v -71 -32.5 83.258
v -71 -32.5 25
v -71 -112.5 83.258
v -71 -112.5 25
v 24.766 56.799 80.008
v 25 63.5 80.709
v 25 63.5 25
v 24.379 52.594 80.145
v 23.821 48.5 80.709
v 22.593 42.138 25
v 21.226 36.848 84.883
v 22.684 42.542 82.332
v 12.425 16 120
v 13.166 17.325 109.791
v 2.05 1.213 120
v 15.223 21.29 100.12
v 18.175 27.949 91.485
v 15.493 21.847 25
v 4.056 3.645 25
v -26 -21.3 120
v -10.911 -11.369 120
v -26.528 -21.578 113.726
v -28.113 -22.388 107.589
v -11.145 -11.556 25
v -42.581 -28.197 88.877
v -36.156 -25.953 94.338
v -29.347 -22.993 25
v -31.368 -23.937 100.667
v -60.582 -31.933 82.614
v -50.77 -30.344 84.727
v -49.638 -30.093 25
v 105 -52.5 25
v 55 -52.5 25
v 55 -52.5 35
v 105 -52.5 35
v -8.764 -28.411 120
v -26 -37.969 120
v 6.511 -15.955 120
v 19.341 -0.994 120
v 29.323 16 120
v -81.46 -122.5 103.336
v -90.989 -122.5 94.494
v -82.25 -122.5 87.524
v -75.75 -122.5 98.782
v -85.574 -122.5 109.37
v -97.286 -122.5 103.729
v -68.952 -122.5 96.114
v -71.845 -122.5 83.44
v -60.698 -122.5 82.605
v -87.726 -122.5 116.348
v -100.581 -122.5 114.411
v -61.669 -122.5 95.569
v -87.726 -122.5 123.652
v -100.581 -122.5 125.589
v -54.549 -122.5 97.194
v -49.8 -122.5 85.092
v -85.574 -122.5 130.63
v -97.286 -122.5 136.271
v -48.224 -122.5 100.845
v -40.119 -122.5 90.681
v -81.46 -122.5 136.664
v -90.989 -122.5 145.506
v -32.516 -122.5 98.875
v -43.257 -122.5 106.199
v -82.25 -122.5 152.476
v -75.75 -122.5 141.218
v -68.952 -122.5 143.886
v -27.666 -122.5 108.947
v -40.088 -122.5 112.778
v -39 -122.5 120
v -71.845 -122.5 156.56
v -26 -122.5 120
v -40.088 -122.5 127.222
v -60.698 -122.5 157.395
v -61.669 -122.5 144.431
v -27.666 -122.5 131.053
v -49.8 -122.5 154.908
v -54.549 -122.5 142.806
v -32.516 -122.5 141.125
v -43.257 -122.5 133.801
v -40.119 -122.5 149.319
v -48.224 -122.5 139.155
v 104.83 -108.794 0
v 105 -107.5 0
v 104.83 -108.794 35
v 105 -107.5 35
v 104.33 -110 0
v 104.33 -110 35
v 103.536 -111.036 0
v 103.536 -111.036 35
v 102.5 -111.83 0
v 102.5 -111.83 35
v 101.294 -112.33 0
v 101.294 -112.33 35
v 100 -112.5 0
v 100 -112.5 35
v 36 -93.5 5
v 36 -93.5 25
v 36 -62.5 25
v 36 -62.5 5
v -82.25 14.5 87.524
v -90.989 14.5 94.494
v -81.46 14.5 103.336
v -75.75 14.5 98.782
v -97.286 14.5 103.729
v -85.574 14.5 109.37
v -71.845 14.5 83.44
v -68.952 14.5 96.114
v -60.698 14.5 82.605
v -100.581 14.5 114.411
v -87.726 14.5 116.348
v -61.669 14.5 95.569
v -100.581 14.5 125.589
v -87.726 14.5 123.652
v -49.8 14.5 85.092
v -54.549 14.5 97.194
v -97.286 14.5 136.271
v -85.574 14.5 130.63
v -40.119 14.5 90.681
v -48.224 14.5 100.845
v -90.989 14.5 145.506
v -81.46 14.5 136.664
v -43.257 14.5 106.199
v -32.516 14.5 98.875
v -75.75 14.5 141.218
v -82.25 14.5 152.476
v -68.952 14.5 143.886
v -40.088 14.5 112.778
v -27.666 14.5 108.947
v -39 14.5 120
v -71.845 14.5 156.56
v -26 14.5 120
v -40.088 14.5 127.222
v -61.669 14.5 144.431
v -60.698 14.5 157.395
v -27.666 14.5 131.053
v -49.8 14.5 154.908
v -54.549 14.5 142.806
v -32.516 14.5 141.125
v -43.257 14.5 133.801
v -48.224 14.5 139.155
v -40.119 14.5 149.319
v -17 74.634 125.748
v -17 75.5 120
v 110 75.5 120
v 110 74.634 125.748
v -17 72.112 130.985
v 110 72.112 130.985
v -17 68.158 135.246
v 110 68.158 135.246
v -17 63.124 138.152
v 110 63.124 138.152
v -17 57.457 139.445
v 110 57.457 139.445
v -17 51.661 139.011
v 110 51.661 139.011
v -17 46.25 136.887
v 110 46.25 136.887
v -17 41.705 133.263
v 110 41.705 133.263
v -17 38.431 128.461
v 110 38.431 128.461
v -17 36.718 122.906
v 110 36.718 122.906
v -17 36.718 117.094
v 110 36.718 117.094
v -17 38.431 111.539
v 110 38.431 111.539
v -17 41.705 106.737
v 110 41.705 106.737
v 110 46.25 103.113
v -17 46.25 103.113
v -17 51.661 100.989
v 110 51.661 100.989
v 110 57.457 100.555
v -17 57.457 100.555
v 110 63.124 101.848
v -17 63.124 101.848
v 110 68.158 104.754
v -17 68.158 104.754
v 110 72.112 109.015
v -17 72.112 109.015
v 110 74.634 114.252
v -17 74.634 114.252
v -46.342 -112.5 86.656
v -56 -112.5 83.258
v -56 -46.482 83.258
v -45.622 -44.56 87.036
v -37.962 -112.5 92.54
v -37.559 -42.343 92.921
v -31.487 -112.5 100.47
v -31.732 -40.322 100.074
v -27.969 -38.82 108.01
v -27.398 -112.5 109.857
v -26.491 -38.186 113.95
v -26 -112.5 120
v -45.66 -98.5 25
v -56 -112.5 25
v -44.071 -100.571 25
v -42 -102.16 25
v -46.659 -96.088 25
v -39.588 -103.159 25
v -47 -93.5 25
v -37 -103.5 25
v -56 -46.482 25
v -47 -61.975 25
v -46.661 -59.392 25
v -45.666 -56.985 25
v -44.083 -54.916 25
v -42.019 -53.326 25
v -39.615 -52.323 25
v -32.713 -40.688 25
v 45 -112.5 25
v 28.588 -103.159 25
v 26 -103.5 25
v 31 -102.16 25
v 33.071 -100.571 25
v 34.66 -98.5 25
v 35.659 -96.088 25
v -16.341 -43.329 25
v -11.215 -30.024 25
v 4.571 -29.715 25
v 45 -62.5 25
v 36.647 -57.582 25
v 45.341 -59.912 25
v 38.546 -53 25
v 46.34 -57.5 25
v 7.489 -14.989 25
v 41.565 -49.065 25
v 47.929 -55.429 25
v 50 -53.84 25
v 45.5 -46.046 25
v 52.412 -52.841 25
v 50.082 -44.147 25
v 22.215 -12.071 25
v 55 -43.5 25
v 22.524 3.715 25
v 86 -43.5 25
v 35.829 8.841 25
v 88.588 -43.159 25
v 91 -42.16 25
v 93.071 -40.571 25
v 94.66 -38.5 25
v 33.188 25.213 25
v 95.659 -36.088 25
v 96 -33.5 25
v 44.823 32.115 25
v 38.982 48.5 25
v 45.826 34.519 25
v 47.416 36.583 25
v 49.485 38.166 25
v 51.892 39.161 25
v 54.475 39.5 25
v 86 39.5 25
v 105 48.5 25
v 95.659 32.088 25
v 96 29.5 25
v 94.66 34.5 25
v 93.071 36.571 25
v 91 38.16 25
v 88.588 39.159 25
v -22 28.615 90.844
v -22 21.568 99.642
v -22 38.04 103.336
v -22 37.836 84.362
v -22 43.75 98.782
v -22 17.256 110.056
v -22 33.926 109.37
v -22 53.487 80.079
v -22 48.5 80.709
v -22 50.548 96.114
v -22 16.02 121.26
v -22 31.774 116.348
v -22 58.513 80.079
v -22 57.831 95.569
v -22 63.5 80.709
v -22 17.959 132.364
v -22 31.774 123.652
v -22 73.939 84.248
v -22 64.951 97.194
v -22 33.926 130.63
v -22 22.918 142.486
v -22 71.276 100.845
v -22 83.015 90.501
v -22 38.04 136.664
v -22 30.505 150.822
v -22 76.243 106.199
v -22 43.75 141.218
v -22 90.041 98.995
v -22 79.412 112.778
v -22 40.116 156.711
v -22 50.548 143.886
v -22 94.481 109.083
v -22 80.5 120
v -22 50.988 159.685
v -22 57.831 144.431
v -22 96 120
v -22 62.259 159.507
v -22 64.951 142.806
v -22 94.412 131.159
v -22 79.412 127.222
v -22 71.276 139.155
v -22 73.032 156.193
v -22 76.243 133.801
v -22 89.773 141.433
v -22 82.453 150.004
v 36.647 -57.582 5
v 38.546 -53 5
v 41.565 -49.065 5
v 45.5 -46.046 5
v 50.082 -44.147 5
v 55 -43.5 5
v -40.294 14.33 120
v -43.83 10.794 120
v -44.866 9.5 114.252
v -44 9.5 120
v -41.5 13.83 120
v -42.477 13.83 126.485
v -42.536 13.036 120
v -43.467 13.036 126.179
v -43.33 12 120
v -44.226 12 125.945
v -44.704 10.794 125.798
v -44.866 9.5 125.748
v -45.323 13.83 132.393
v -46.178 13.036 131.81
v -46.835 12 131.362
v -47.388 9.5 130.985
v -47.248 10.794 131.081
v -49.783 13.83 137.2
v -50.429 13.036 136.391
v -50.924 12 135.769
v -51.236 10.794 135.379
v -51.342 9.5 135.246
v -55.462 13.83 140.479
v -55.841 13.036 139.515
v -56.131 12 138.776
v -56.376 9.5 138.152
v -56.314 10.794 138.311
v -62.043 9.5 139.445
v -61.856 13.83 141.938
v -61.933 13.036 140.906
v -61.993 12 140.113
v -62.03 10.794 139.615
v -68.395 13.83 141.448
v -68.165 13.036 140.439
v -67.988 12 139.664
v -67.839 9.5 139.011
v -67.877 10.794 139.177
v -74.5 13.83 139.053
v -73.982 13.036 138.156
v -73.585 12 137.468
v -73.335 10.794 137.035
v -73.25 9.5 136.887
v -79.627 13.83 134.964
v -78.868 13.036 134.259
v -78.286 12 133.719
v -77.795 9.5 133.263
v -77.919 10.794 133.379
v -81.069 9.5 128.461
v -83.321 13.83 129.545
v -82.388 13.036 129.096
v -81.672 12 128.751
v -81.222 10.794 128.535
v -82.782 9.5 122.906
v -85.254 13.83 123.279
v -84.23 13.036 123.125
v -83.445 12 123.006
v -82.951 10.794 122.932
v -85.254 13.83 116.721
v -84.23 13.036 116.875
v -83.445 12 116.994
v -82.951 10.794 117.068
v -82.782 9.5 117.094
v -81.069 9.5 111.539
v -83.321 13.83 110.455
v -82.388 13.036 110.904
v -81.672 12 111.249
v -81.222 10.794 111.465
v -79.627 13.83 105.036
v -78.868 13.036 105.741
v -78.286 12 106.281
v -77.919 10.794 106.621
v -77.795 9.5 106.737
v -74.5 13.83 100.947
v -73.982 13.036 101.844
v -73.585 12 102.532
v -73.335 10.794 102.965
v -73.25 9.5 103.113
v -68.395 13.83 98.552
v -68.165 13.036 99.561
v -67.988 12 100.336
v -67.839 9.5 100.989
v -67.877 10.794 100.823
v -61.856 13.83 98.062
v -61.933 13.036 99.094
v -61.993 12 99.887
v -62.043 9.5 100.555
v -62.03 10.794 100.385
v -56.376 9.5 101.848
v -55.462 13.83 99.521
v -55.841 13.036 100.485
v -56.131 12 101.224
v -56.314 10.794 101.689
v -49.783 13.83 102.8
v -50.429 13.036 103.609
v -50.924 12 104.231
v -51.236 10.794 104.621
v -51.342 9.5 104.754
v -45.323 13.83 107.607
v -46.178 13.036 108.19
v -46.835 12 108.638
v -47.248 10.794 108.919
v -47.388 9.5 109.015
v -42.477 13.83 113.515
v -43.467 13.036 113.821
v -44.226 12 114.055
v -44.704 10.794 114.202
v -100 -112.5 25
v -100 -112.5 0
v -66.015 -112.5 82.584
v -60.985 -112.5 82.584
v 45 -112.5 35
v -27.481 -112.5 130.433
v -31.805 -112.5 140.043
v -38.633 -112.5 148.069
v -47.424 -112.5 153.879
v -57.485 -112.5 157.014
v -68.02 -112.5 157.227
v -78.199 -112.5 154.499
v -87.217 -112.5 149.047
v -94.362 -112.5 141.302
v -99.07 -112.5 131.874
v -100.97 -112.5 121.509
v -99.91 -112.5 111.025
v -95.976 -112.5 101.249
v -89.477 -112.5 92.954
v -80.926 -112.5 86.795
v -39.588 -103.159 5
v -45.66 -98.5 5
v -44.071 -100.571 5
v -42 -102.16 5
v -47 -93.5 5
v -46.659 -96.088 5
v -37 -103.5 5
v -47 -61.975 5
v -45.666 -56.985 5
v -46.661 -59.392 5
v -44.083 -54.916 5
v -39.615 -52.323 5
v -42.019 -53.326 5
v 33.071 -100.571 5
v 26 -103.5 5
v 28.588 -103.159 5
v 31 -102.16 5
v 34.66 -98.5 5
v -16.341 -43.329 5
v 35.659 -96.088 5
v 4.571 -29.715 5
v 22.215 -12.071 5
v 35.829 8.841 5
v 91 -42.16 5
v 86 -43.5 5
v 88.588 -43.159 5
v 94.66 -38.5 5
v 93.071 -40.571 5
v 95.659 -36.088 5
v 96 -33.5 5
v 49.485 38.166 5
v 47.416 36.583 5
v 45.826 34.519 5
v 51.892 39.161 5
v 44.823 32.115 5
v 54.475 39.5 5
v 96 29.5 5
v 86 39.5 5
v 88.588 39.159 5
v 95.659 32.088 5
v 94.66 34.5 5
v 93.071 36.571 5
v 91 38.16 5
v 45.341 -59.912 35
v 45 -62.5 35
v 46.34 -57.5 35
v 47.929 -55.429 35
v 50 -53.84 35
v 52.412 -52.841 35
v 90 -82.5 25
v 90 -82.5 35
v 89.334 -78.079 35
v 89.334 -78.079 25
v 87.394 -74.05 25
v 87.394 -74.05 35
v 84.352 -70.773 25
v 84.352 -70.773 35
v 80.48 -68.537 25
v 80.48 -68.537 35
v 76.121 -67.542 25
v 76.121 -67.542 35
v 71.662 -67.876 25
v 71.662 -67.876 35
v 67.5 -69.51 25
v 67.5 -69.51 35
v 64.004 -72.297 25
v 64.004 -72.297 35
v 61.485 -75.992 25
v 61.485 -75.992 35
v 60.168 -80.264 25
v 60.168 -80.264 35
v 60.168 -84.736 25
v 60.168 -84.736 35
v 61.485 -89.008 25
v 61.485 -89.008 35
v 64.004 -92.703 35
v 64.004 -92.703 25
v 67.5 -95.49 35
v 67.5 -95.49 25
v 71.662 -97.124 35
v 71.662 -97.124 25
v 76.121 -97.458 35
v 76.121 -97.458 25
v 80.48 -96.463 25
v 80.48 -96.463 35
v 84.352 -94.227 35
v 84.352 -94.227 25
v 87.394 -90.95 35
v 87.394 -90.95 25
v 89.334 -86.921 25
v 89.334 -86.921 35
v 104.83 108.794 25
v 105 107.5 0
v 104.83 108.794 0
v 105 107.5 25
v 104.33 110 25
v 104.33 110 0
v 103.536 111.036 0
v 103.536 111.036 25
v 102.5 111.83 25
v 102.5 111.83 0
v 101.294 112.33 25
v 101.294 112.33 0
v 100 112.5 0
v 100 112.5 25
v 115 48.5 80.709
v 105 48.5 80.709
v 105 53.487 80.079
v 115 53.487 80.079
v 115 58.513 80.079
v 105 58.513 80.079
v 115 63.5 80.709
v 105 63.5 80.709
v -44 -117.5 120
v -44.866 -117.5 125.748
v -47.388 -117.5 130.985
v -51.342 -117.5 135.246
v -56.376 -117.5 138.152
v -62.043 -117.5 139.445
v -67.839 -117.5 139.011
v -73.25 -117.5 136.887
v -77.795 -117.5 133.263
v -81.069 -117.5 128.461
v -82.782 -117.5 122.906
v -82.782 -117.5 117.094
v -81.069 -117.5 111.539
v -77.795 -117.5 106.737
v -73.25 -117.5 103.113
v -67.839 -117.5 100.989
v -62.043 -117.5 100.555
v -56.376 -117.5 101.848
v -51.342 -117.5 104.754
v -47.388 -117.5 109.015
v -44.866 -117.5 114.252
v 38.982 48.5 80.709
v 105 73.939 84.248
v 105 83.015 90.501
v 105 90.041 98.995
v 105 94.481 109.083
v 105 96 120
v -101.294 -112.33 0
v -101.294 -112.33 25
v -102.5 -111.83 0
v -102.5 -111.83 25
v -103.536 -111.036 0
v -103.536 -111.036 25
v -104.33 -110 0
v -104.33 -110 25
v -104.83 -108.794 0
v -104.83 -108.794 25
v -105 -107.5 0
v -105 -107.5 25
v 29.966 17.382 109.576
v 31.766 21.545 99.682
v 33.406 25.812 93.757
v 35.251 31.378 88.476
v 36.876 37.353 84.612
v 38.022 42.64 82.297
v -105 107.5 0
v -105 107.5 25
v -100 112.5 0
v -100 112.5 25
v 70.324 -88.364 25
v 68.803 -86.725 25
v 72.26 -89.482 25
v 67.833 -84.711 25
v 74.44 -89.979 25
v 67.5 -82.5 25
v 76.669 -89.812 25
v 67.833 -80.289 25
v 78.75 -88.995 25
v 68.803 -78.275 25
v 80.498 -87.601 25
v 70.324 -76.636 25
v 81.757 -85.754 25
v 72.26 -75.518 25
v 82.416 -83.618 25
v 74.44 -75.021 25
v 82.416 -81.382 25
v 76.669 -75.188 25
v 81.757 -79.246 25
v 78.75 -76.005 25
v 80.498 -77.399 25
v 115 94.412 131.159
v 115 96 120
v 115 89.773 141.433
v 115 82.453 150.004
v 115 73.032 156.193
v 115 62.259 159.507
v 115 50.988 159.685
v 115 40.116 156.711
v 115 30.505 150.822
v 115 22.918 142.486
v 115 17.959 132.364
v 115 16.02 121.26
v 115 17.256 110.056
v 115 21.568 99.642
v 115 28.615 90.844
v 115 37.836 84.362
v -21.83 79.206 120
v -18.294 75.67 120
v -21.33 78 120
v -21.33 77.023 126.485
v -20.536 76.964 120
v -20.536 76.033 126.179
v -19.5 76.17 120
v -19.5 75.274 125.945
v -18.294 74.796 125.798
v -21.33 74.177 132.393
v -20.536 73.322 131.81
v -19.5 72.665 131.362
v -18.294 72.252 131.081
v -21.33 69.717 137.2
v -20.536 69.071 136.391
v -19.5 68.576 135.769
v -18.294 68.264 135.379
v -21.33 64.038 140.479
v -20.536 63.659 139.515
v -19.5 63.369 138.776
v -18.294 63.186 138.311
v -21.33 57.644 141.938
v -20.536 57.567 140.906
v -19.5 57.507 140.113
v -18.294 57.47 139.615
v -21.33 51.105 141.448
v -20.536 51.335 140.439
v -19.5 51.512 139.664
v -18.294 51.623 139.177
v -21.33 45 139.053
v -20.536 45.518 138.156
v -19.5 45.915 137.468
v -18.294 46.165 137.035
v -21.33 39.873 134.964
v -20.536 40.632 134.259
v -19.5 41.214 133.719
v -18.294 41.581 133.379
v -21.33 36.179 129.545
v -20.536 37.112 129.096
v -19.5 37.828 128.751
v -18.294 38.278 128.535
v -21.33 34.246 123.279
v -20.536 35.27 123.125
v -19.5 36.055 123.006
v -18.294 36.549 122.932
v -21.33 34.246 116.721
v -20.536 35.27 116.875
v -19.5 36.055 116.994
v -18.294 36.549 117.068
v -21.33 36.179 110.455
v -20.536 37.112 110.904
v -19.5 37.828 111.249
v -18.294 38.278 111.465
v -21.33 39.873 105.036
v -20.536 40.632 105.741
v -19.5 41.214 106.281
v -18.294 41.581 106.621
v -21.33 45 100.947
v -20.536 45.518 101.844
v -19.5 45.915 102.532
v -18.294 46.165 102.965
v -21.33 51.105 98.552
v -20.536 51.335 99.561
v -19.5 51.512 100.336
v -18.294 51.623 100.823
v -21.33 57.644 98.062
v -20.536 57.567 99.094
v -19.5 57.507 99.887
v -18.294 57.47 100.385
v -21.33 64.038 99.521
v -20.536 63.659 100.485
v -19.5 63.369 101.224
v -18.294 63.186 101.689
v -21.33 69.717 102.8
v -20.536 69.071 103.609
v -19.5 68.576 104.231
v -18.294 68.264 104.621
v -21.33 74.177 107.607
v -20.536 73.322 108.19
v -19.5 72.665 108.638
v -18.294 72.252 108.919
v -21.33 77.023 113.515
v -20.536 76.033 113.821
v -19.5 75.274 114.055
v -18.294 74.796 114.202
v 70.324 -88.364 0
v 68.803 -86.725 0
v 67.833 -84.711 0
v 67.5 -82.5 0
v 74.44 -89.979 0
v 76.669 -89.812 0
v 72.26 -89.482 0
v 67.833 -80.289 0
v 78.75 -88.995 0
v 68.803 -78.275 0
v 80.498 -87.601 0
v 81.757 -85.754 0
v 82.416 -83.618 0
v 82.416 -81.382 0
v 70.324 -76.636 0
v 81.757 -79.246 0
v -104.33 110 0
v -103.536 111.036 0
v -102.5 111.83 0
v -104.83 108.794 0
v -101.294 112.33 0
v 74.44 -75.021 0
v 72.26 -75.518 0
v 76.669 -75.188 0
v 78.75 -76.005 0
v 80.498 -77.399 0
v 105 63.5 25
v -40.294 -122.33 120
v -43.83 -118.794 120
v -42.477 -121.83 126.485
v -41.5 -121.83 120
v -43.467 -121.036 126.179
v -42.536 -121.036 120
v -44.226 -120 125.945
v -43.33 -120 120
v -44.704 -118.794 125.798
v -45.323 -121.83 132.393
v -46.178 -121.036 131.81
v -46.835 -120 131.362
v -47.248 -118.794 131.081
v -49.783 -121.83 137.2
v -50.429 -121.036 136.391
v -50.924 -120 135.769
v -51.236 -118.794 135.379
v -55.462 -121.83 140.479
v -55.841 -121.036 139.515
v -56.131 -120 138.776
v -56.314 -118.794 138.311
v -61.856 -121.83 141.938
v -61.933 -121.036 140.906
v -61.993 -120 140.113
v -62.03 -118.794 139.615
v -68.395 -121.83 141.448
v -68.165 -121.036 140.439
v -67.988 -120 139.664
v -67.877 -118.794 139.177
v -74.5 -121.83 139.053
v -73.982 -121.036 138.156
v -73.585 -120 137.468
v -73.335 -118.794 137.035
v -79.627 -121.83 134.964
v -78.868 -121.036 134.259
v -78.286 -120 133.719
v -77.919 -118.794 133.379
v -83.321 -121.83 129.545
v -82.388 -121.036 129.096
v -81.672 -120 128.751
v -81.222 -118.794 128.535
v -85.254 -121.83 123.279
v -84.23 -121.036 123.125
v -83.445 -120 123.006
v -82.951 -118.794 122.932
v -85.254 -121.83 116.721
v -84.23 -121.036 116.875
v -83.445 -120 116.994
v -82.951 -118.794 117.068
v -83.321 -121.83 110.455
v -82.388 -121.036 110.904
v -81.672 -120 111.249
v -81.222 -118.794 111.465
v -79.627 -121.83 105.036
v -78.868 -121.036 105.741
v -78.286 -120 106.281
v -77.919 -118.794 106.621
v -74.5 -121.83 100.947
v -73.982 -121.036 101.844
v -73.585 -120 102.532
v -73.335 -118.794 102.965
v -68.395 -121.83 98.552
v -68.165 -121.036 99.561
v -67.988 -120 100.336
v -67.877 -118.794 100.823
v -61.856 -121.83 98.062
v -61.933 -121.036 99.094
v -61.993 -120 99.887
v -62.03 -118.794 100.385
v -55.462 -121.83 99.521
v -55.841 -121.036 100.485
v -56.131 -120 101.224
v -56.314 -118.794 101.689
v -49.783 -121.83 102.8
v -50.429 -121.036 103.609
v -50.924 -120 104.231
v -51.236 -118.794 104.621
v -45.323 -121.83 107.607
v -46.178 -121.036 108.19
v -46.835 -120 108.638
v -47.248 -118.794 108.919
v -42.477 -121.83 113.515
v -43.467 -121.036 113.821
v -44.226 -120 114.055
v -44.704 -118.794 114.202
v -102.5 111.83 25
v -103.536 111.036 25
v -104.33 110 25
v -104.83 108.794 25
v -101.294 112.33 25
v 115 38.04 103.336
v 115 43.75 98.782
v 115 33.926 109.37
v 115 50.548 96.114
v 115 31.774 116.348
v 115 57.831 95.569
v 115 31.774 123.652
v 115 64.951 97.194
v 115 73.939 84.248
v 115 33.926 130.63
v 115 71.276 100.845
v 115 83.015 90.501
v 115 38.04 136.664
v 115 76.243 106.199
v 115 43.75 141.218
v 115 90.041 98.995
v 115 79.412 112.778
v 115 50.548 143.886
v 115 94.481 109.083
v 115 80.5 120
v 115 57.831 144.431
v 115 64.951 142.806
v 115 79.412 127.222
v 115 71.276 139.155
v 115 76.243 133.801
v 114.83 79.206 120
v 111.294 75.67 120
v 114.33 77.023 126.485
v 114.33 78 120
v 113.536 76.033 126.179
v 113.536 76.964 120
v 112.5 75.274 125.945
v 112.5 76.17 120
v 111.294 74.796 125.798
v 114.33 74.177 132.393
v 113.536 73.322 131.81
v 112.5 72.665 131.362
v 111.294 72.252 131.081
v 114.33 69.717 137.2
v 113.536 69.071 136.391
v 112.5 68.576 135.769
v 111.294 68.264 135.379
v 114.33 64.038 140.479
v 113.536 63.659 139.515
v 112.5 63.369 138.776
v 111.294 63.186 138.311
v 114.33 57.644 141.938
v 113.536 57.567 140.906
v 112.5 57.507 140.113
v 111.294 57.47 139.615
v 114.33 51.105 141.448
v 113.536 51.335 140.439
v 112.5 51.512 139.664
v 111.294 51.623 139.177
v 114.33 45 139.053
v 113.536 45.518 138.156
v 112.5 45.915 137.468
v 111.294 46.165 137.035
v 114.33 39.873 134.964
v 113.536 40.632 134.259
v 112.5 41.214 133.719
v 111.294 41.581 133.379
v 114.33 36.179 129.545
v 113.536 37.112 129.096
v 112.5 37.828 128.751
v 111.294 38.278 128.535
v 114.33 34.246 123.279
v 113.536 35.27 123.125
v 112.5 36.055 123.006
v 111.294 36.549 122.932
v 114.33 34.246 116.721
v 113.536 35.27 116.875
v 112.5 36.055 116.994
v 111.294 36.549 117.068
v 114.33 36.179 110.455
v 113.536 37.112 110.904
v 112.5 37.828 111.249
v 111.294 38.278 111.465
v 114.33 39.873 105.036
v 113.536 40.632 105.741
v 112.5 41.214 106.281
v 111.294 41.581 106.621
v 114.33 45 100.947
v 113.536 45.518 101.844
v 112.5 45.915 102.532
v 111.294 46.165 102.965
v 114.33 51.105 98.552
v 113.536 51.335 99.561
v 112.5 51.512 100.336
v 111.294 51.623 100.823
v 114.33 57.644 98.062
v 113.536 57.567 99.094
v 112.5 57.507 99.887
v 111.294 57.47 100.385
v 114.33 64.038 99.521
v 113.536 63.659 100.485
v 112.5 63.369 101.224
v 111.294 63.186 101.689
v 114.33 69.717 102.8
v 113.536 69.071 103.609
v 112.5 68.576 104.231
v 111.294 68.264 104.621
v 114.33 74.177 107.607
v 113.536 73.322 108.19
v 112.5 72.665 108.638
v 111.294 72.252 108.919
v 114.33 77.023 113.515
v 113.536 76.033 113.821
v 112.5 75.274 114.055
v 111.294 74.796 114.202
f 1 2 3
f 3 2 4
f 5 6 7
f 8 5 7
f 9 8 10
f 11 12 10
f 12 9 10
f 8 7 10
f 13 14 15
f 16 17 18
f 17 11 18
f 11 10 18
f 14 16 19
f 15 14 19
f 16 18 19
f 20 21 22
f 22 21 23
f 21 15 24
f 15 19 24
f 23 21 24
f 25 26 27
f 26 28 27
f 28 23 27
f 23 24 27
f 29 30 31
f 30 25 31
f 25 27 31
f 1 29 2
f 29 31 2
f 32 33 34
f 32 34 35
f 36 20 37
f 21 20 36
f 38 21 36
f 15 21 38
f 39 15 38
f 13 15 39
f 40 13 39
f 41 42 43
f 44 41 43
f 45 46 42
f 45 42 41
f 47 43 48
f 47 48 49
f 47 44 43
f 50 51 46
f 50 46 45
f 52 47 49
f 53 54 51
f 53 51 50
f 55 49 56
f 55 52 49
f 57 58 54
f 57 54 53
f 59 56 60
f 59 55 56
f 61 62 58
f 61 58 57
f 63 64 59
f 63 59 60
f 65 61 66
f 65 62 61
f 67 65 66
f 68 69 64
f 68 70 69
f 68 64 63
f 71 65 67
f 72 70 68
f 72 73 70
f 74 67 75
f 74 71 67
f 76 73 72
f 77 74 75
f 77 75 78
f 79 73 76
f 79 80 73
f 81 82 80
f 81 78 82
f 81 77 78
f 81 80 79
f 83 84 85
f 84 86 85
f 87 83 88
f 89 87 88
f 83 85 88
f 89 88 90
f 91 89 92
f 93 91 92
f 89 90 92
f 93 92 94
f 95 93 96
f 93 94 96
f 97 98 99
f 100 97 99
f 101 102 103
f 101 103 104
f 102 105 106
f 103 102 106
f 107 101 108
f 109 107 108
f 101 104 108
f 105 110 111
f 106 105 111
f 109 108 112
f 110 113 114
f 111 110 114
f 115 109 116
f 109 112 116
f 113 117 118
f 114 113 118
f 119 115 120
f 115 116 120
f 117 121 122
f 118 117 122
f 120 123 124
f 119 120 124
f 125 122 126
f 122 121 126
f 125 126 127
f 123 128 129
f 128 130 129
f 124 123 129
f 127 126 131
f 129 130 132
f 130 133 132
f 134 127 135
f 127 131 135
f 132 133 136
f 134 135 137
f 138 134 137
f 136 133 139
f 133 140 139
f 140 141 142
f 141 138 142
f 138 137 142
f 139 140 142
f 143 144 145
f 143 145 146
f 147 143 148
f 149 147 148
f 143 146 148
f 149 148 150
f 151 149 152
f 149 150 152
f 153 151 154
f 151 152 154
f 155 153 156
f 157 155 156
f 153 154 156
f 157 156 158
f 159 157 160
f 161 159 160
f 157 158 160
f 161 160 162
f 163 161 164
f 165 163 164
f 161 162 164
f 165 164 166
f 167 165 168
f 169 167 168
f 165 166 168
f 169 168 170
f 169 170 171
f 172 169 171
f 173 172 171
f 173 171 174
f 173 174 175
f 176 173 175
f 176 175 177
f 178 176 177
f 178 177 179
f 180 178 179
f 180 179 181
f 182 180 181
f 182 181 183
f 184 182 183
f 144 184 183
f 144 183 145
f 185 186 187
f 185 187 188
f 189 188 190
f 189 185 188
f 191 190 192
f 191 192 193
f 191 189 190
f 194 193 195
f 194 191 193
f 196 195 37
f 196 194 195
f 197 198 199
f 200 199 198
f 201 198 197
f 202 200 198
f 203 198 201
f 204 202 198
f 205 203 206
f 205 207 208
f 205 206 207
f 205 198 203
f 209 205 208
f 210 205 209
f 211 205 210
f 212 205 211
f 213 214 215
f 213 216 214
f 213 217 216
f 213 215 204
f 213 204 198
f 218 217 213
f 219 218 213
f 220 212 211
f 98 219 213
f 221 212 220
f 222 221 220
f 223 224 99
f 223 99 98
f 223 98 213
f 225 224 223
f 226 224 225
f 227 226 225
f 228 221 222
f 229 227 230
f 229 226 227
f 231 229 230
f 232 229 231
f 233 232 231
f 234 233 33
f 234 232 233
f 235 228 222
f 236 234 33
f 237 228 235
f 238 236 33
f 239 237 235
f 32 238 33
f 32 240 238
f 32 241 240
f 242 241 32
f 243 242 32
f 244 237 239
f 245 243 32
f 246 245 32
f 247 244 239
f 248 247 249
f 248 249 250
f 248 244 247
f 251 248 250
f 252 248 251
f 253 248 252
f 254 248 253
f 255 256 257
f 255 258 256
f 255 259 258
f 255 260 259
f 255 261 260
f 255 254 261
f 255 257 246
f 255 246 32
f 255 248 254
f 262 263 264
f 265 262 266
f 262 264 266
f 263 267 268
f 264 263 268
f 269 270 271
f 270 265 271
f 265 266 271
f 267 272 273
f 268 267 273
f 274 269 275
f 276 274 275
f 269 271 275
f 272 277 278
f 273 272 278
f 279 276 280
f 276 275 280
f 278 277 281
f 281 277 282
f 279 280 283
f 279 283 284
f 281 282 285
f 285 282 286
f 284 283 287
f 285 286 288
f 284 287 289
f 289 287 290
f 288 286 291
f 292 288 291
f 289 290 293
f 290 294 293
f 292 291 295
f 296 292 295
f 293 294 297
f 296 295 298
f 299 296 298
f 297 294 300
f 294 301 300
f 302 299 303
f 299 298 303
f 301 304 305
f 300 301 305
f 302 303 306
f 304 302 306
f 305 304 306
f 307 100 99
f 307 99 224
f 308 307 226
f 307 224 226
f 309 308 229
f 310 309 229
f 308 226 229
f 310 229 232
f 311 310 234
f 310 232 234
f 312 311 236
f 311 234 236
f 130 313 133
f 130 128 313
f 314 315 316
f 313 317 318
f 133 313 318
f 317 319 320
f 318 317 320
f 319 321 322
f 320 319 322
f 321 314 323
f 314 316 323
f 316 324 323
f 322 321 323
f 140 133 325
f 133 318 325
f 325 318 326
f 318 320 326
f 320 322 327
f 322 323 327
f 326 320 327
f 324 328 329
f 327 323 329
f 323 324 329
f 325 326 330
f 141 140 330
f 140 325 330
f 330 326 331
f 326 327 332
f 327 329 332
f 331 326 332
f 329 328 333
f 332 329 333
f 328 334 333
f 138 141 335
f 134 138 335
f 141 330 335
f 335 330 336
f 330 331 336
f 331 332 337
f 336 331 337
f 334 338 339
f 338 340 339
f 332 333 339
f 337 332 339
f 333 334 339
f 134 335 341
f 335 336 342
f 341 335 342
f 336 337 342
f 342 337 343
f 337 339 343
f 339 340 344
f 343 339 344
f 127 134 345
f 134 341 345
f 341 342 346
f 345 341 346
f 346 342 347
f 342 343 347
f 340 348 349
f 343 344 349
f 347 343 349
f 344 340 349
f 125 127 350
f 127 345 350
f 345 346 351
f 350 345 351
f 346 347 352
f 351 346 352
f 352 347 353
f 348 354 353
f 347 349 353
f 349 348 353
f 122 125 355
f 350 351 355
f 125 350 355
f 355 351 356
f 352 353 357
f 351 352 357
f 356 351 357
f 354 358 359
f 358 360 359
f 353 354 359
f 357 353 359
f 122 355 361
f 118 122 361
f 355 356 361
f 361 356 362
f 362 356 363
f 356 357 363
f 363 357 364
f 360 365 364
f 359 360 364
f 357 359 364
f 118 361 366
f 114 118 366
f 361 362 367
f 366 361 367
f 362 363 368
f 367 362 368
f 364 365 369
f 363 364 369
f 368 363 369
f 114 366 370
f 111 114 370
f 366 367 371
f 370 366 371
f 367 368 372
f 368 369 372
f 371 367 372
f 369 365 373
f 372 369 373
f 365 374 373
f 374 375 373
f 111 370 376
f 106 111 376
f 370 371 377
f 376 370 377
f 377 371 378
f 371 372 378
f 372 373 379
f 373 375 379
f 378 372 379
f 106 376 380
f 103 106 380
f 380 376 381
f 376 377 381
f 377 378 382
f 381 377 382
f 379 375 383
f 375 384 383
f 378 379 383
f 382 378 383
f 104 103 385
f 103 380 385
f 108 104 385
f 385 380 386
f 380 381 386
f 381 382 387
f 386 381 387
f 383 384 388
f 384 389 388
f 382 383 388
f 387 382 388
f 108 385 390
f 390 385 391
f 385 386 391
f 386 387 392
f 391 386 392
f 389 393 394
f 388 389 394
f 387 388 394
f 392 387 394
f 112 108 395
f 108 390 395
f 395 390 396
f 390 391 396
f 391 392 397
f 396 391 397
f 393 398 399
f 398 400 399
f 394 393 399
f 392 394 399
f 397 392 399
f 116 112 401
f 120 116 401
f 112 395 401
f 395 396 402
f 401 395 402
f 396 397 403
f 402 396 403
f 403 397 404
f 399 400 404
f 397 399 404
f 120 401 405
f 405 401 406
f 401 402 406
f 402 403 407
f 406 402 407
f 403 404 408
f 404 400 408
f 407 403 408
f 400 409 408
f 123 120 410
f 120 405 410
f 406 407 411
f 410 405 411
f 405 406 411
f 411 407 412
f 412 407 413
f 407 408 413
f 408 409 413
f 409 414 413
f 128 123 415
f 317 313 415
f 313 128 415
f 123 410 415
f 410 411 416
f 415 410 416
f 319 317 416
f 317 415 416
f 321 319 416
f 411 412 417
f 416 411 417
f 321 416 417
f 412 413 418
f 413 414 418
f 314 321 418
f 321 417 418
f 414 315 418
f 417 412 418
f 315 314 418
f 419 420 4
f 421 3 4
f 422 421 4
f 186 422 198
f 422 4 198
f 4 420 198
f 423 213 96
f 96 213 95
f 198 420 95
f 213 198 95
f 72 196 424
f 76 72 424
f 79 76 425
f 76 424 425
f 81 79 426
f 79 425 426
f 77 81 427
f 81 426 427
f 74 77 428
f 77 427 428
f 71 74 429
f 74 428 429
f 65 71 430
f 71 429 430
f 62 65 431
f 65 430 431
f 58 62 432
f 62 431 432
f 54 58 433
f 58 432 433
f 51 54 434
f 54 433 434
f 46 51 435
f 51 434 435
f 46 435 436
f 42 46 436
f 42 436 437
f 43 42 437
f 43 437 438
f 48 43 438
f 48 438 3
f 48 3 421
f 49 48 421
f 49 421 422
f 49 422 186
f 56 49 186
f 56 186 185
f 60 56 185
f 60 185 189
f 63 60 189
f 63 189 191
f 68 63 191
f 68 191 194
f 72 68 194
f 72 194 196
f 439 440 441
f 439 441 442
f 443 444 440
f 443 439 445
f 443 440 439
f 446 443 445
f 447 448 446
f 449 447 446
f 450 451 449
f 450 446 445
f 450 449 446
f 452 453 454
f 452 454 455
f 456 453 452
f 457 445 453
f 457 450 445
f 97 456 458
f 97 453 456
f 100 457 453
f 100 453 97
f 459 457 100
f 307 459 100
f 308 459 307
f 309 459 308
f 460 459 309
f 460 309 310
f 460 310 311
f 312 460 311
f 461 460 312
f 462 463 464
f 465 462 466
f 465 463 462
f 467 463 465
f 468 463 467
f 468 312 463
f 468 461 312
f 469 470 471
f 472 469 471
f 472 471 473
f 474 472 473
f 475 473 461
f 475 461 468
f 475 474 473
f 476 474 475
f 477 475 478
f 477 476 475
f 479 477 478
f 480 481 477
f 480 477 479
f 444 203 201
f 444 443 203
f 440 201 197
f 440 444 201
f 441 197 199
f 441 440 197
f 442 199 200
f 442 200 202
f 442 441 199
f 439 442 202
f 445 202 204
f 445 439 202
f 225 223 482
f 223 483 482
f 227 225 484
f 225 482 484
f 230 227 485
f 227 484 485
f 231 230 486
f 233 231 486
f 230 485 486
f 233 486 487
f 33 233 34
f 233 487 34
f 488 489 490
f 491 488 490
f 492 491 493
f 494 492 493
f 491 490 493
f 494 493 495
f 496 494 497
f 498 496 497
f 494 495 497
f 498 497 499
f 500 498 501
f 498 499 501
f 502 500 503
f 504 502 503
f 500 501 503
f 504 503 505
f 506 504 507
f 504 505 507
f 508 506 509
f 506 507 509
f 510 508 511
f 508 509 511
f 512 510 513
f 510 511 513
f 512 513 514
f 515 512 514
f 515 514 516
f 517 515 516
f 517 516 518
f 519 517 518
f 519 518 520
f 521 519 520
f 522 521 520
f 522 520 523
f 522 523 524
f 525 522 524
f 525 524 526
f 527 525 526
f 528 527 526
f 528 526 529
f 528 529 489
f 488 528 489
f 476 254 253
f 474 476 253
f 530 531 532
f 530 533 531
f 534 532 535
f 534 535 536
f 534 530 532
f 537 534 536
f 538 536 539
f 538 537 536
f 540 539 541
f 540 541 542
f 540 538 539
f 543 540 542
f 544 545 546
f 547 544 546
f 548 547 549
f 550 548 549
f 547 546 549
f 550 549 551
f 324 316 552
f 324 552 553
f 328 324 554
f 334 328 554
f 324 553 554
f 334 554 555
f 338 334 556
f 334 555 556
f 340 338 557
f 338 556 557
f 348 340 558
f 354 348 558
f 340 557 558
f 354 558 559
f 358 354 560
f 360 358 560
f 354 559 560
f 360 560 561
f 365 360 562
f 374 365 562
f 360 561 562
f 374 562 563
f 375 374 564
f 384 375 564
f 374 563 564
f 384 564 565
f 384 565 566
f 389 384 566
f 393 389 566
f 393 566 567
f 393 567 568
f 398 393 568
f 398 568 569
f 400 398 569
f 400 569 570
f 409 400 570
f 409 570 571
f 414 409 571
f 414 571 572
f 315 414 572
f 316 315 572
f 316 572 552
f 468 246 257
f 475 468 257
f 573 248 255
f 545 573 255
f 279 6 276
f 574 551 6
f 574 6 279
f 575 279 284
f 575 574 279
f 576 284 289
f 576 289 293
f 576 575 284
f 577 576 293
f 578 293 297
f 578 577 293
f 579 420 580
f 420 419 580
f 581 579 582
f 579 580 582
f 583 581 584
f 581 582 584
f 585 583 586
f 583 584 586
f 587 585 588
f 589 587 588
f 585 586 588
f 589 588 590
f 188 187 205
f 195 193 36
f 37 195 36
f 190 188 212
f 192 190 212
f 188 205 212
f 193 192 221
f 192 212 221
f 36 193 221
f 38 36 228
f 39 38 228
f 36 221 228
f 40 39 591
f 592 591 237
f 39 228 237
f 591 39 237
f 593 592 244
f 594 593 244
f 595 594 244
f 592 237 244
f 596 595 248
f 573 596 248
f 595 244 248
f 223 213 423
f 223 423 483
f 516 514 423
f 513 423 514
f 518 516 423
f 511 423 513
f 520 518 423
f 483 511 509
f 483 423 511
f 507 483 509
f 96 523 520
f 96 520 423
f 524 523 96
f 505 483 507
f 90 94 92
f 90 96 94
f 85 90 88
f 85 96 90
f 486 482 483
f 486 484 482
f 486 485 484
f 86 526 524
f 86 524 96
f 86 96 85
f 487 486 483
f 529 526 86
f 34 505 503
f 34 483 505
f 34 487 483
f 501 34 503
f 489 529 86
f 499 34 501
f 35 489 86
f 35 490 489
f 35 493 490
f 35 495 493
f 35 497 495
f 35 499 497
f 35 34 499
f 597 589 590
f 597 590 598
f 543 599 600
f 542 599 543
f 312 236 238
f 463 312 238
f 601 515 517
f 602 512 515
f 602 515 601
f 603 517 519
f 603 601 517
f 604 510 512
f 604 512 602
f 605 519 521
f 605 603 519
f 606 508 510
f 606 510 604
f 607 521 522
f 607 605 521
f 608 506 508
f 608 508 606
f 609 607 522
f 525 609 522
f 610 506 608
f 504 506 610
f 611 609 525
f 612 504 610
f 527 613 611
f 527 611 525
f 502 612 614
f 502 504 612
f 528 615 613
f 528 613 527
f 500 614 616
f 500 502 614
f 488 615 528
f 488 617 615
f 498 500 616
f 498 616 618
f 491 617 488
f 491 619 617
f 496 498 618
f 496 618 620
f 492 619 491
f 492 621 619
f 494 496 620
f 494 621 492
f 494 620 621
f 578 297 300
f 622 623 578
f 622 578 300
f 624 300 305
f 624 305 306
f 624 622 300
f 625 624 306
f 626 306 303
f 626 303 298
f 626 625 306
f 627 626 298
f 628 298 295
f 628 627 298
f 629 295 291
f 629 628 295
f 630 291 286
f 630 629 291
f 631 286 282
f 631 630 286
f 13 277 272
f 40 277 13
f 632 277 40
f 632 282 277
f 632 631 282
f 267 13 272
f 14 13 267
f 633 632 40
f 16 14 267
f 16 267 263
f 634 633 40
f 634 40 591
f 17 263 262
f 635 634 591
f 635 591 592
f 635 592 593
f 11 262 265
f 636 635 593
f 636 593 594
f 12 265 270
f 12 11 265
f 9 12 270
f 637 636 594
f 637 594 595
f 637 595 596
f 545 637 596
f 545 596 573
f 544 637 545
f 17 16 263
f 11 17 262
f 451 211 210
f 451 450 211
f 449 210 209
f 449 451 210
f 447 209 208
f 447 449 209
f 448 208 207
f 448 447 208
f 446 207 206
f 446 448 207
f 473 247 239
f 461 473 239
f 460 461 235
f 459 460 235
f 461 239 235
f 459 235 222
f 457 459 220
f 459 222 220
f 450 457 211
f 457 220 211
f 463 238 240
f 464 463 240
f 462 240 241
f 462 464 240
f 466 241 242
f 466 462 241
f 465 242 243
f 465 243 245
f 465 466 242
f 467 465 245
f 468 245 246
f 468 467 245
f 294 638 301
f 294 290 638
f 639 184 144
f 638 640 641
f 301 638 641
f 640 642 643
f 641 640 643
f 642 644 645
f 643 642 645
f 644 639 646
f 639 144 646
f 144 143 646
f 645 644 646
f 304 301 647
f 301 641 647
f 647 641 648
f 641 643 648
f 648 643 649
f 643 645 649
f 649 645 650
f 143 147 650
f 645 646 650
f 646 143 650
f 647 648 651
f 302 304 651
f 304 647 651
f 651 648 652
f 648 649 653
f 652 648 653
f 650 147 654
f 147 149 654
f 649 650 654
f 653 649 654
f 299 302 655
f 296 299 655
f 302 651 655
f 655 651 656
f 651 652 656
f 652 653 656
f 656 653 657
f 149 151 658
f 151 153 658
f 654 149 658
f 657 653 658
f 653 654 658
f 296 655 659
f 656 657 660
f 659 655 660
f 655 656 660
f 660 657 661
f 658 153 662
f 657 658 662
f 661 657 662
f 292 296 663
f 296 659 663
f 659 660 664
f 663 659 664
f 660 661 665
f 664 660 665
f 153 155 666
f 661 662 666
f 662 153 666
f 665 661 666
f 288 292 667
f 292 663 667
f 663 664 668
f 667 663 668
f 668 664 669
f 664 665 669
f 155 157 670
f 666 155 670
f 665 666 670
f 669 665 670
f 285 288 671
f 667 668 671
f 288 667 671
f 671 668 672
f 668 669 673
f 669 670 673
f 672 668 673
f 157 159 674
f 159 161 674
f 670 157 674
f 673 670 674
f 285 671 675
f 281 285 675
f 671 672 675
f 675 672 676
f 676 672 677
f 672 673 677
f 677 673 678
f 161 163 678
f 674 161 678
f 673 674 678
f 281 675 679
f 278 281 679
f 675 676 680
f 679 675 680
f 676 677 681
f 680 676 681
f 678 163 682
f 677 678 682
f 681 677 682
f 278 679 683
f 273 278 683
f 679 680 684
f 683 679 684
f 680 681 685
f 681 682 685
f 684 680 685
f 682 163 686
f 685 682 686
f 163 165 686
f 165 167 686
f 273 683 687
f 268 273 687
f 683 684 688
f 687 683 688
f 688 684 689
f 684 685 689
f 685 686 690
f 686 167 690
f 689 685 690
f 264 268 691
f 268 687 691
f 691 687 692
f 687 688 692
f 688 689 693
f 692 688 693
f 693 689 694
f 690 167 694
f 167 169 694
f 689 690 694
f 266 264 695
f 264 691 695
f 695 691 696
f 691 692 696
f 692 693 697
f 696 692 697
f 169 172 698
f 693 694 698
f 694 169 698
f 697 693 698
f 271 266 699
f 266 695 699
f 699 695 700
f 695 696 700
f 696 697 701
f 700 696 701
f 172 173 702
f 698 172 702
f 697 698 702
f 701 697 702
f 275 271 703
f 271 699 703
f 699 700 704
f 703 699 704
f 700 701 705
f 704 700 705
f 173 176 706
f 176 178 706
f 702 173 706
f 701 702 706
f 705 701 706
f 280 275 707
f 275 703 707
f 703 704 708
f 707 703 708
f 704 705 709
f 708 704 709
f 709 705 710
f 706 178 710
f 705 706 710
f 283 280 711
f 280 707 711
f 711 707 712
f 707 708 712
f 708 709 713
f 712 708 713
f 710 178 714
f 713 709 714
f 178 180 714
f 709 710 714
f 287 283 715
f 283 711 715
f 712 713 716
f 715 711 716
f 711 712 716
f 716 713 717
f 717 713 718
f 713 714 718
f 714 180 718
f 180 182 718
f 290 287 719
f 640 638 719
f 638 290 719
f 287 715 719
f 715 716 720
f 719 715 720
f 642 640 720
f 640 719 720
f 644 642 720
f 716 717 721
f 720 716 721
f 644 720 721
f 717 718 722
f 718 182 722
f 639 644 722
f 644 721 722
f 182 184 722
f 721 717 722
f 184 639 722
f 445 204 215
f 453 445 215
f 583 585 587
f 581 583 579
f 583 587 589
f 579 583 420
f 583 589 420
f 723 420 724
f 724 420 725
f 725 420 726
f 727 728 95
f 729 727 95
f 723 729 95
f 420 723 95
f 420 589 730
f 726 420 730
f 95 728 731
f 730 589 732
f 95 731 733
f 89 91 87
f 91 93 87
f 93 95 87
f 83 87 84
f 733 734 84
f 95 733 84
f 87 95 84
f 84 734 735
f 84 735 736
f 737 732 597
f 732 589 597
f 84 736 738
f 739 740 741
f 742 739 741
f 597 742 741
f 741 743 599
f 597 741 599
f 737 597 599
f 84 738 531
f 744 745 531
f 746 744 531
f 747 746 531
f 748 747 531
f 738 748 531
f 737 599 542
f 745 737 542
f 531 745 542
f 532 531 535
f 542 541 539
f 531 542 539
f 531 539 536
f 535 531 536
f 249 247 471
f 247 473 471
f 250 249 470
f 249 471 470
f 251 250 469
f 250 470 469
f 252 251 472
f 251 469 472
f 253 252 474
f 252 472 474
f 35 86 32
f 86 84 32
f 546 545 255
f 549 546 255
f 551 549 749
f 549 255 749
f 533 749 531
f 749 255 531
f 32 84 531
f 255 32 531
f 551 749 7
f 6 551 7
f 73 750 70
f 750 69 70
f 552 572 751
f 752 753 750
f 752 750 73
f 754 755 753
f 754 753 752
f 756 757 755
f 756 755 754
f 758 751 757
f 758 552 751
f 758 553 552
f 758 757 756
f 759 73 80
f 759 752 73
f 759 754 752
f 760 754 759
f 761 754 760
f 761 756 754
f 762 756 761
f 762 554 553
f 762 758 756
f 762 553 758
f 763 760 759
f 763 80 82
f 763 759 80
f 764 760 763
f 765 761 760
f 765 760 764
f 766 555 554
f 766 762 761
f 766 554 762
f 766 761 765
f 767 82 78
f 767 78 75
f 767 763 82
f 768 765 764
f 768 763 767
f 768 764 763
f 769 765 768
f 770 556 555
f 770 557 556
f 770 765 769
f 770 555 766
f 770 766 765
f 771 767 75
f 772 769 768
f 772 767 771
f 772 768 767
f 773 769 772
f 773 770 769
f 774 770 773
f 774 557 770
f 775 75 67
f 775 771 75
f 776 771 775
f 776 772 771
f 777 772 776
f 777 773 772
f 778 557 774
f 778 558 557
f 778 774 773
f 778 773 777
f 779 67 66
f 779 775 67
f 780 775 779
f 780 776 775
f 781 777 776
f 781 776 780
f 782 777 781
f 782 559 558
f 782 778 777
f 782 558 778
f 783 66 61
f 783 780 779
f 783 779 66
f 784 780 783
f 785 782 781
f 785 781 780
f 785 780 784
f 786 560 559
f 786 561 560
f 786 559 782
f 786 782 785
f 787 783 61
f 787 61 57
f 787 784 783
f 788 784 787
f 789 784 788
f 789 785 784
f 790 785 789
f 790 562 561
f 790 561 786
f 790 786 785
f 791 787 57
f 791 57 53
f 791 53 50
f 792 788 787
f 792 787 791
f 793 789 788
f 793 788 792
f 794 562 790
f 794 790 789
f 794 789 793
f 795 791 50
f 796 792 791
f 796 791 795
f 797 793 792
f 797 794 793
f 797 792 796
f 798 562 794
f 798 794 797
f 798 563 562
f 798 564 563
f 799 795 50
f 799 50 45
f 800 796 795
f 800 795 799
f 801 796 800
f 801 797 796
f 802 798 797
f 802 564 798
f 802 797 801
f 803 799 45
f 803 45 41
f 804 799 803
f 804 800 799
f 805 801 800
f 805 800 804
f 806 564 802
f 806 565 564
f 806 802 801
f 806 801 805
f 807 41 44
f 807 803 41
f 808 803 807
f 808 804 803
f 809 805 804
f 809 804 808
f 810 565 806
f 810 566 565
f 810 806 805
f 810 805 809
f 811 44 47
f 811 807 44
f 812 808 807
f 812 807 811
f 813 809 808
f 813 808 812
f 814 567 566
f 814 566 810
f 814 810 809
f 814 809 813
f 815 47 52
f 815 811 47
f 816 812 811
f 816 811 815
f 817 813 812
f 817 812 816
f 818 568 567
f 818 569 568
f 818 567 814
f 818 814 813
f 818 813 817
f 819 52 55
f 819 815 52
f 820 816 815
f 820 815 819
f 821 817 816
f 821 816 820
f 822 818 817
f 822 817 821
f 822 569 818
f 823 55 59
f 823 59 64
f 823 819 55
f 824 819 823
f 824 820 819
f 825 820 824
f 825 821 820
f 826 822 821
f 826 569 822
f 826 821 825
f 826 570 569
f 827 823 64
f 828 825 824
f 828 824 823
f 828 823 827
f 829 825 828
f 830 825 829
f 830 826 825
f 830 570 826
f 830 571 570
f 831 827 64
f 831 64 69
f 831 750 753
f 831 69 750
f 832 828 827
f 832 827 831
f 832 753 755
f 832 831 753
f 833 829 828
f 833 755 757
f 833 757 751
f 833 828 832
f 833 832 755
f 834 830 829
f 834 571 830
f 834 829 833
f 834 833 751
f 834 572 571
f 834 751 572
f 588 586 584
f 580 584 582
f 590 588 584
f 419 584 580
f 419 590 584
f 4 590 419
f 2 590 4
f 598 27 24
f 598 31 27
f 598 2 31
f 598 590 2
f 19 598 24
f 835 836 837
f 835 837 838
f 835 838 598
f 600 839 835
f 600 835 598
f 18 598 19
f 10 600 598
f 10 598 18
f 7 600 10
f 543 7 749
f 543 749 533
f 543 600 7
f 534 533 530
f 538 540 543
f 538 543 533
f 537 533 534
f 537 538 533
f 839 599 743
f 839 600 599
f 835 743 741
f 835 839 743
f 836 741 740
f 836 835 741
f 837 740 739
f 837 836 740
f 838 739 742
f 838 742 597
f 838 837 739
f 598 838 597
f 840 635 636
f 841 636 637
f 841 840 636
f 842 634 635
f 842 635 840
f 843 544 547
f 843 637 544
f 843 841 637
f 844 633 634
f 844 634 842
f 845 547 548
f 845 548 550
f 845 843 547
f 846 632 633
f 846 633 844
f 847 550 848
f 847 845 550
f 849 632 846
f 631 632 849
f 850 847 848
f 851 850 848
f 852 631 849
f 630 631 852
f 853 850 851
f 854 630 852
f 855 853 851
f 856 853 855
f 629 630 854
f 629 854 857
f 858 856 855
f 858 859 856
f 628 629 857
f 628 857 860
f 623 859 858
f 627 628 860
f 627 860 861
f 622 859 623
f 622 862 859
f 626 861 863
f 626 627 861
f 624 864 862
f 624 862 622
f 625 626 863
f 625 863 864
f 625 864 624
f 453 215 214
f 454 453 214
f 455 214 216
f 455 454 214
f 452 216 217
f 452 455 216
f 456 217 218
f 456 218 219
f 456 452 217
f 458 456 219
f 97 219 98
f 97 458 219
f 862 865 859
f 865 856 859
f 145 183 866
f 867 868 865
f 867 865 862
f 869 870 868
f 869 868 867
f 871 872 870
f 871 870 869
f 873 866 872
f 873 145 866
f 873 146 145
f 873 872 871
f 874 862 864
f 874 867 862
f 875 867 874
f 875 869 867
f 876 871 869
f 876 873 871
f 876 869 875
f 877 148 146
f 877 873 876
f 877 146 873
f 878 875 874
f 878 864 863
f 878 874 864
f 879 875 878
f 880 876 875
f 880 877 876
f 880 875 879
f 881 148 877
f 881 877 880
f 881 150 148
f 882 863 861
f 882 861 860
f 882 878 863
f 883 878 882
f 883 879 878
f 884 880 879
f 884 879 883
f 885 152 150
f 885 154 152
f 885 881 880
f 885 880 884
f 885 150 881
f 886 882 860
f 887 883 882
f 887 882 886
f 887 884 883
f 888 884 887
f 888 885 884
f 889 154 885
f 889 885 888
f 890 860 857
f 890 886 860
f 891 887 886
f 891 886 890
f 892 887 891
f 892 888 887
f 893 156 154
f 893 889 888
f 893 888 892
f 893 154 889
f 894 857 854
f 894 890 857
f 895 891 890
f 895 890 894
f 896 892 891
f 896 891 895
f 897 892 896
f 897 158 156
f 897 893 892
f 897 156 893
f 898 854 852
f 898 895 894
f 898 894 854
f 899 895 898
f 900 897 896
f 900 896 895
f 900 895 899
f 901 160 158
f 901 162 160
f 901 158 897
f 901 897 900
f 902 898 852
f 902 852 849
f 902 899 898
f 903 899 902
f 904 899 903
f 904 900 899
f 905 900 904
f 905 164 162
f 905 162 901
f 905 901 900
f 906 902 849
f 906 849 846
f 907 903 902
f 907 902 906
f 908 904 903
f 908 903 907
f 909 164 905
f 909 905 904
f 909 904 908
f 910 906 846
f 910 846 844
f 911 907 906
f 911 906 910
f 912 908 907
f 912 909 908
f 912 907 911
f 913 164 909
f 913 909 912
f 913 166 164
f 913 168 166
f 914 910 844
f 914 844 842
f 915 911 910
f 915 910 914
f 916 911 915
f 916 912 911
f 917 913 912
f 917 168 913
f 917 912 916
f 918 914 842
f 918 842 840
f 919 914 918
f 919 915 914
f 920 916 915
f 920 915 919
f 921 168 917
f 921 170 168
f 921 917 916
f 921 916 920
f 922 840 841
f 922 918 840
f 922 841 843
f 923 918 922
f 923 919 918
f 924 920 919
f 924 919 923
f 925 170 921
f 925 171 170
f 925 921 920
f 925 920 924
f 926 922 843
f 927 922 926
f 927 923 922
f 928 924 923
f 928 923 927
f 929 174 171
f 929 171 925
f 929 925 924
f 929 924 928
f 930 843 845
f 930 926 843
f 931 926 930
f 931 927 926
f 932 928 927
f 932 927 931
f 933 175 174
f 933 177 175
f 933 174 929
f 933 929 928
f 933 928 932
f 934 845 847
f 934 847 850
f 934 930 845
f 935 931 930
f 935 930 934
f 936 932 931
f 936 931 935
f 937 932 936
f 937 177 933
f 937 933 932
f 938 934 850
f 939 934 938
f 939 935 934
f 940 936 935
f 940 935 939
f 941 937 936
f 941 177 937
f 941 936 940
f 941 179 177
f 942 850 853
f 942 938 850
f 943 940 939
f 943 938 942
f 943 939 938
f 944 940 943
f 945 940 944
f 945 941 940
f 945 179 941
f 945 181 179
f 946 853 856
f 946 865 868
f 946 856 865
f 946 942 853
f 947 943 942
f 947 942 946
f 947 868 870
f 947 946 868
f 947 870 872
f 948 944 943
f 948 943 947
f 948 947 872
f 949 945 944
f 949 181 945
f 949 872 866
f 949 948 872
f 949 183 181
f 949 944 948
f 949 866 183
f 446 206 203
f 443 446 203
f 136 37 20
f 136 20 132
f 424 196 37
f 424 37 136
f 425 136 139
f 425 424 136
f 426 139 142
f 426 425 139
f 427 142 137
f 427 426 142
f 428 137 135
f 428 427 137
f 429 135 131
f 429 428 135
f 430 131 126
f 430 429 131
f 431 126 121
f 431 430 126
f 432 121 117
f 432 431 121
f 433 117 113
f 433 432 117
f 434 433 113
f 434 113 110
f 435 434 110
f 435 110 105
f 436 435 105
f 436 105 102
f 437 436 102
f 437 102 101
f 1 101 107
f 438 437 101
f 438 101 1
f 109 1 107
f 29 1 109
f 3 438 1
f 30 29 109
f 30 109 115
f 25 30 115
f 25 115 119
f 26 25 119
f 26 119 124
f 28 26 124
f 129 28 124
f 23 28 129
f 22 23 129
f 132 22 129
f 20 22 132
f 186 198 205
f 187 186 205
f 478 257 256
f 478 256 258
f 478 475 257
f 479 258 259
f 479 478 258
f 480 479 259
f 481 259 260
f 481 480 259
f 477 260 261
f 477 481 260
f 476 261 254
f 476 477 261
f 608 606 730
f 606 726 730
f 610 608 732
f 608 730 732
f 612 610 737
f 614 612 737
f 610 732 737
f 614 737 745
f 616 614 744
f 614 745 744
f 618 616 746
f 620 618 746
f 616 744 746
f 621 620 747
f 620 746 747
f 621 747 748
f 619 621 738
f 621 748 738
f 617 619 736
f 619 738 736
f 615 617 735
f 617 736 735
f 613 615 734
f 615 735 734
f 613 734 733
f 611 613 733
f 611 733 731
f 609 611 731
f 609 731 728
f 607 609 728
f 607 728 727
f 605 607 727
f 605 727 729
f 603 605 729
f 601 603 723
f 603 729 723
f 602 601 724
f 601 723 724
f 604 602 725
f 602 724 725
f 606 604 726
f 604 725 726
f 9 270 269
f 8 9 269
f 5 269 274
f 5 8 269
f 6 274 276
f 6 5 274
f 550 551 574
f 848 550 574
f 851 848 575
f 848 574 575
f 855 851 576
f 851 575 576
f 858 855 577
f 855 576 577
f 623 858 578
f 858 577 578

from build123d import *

# Parameters (mm, degrees)
F0_W            = 210
F0_H            = 225
F1_DEPTH        = 25
F3_DEPTH        = 95
F4_R            = 37.5
F5_DEPTH        = 10
F5_DEPTH_BACK   = 127
F7_DEPTH        = 10
F7_DEPTH_BACK   = 127
F8_W            = 60
F8_H            = 60
F9_DEPTH        = 10
F10_R           = 10
F12_DEPTH       = 20
F14_D           = 15
F14_CBORE_D     = 30
F14_CBORE_DEPTH = 10
F15_R           = 10
F16_R           = 19.5
F17_DEPTH       = 235.001
F18_R           = 19.5
F19_DEPTH       = 220.001
F20_R           = 5


with BuildPart() as f1:
    # F0 (on Top) → F1 (new body)
    with BuildSketch(Plane.XY):
        Rectangle(F0_W, F0_H)
    extrude(amount=F1_DEPTH)

    # F2 (on face) → F3 (join)
    with BuildSketch(Plane.XY.offset(25)):
        with BuildLine():
            Line((-71, -32.5), (-71, -112.5))
            Line((-71, -112.5), (-56, -112.5))
            Line((-56, -112.5), (-56, -46.4818166789))
            ThreePointArc((-56, -46.4818166789), (7.4888527117, -14.9888527117), (38.9818166789, 48.5))
            Line((38.9818166789, 48.5), (105, 48.5))
            Line((105, 48.5), (105, 63.5))
            Line((105, 63.5), (25, 63.5))
            ThreePointArc((25, 63.5), (-3.1177490061, -4.3822509939), (-71, -32.5))
        make_face()
    extrude(amount=F3_DEPTH)

    # F4 (on face) → F5 (join, two sides)
    with BuildSketch(Plane.XZ.offset(112.5)) as f5_sk:
        with Locations((-63.5, 120)):
            Circle(F4_R)
    extrude(amount=F5_DEPTH)
    extrude(f5_sk.sketch, amount=-F5_DEPTH_BACK)

    # F6 (on face) → F7 (join, two sides)
    with BuildSketch(Plane.YZ.offset(105)) as f7_sk:
        with BuildLine():
            Line((48.5, 120), (48.5, 80.7094158862))
            ThreePointArc((48.5, 80.7094158862), (56, 80), (63.5, 80.7094158862))
            Line((63.5, 80.7094158862), (63.5, 120))
            Line((63.5, 120), (48.5, 120))
        make_face()
        with BuildLine():
            ThreePointArc((63.5, 80.7094158862), (86.8220700148, 94.504902432), (96, 120))
            ThreePointArc((96, 120), (30.504902432, 150.8220700148), (48.5, 80.7094158862))
            Line((48.5, 80.7094158862), (48.5, 120))
            Line((48.5, 120), (63.5, 120))
            Line((63.5, 120), (63.5, 80.7094158862))
        make_face()
    extrude(amount=F7_DEPTH)
    extrude(f7_sk.sketch, amount=-F7_DEPTH_BACK)

    # F8 (on face) → F9 (join)
    with BuildSketch(Plane.XY.offset(25)):
        with Locations((75, -82.5)):
            Rectangle(F8_W, F8_H)
    extrude(amount=F9_DEPTH)

    # F10
    f10_edges = [f1.edges().sort_by_distance(p)[0] for p in [
        (45, -52.5, 30),
    ]]
    fillet(f10_edges, radius=F10_R)

    # F11 (on face) → F12 (cut)
    with BuildSketch(Plane.XY.offset(25)):
        with BuildLine():
            ThreePointArc((46.5755076536, 39.5), (13.8528137424, -21.3528137424), (-47, -54.0755076536))
            Line((-47, -54.0755076536), (-47, -103.5))
            Line((-47, -103.5), (36, -103.5))
            Line((36, -103.5), (36, -62.5))
            ThreePointArc((36, -62.5), (41.5649711575, -49.0649711575), (55, -43.5))
            Line((55, -43.5), (96, -43.5))
            Line((96, -43.5), (96, 39.5))
            Line((96, 39.5), (46.5755076536, 39.5))
        make_face()
    extrude(amount=-F12_DEPTH, mode=Mode.SUBTRACT)

    # F14 (through all)
    with Locations(Plane.XY.offset(35)):
        with Locations((75, -82.5)):
            CounterBoreHole(F14_D / 2, F14_CBORE_D / 2, F14_CBORE_DEPTH)

    # F15
    f15_edges = [f1.edges().sort_by_distance(p)[0] for p in [
        (-47, -103.5, 15),
        (96, 39.5, 15),
        (-47, -54.075508, 15),
        (46.575508, 39.5, 15),
        (96, -43.5, 15),
        (36, -103.5, 15),
    ]]
    fillet(f15_edges, radius=F15_R)

    # F16 (on face) → F17 (cut, through all)
    with BuildSketch(Plane.XZ.offset(122.5)):
        with Locations((-63.5, 120)):
            Circle(F16_R)
    extrude(amount=-F17_DEPTH, mode=Mode.SUBTRACT)

    # F18 (on face) → F19 (cut, through all)
    with BuildSketch(Plane.YZ.offset(115)):
        with Locations((56, 120)):
            Circle(F18_R)
    extrude(amount=-F19_DEPTH, mode=Mode.SUBTRACT)

    # F20
    f20_edges = [f1.edges().sort_by_distance(p)[0] for p in [
        (-105, -112.5, 12.5),
        (105, -112.5, 17.5),
        (105, 112.5, 12.5),
        (-105, 112.5, 12.5),
        (-83, 14.5, 120),
        (-22, 36.5, 120),
        (115, 36.5, 120),
        (-83, -122.5, 120),
    ]]
    fillet(f20_edges, radius=F20_R)


solid = f1.part
